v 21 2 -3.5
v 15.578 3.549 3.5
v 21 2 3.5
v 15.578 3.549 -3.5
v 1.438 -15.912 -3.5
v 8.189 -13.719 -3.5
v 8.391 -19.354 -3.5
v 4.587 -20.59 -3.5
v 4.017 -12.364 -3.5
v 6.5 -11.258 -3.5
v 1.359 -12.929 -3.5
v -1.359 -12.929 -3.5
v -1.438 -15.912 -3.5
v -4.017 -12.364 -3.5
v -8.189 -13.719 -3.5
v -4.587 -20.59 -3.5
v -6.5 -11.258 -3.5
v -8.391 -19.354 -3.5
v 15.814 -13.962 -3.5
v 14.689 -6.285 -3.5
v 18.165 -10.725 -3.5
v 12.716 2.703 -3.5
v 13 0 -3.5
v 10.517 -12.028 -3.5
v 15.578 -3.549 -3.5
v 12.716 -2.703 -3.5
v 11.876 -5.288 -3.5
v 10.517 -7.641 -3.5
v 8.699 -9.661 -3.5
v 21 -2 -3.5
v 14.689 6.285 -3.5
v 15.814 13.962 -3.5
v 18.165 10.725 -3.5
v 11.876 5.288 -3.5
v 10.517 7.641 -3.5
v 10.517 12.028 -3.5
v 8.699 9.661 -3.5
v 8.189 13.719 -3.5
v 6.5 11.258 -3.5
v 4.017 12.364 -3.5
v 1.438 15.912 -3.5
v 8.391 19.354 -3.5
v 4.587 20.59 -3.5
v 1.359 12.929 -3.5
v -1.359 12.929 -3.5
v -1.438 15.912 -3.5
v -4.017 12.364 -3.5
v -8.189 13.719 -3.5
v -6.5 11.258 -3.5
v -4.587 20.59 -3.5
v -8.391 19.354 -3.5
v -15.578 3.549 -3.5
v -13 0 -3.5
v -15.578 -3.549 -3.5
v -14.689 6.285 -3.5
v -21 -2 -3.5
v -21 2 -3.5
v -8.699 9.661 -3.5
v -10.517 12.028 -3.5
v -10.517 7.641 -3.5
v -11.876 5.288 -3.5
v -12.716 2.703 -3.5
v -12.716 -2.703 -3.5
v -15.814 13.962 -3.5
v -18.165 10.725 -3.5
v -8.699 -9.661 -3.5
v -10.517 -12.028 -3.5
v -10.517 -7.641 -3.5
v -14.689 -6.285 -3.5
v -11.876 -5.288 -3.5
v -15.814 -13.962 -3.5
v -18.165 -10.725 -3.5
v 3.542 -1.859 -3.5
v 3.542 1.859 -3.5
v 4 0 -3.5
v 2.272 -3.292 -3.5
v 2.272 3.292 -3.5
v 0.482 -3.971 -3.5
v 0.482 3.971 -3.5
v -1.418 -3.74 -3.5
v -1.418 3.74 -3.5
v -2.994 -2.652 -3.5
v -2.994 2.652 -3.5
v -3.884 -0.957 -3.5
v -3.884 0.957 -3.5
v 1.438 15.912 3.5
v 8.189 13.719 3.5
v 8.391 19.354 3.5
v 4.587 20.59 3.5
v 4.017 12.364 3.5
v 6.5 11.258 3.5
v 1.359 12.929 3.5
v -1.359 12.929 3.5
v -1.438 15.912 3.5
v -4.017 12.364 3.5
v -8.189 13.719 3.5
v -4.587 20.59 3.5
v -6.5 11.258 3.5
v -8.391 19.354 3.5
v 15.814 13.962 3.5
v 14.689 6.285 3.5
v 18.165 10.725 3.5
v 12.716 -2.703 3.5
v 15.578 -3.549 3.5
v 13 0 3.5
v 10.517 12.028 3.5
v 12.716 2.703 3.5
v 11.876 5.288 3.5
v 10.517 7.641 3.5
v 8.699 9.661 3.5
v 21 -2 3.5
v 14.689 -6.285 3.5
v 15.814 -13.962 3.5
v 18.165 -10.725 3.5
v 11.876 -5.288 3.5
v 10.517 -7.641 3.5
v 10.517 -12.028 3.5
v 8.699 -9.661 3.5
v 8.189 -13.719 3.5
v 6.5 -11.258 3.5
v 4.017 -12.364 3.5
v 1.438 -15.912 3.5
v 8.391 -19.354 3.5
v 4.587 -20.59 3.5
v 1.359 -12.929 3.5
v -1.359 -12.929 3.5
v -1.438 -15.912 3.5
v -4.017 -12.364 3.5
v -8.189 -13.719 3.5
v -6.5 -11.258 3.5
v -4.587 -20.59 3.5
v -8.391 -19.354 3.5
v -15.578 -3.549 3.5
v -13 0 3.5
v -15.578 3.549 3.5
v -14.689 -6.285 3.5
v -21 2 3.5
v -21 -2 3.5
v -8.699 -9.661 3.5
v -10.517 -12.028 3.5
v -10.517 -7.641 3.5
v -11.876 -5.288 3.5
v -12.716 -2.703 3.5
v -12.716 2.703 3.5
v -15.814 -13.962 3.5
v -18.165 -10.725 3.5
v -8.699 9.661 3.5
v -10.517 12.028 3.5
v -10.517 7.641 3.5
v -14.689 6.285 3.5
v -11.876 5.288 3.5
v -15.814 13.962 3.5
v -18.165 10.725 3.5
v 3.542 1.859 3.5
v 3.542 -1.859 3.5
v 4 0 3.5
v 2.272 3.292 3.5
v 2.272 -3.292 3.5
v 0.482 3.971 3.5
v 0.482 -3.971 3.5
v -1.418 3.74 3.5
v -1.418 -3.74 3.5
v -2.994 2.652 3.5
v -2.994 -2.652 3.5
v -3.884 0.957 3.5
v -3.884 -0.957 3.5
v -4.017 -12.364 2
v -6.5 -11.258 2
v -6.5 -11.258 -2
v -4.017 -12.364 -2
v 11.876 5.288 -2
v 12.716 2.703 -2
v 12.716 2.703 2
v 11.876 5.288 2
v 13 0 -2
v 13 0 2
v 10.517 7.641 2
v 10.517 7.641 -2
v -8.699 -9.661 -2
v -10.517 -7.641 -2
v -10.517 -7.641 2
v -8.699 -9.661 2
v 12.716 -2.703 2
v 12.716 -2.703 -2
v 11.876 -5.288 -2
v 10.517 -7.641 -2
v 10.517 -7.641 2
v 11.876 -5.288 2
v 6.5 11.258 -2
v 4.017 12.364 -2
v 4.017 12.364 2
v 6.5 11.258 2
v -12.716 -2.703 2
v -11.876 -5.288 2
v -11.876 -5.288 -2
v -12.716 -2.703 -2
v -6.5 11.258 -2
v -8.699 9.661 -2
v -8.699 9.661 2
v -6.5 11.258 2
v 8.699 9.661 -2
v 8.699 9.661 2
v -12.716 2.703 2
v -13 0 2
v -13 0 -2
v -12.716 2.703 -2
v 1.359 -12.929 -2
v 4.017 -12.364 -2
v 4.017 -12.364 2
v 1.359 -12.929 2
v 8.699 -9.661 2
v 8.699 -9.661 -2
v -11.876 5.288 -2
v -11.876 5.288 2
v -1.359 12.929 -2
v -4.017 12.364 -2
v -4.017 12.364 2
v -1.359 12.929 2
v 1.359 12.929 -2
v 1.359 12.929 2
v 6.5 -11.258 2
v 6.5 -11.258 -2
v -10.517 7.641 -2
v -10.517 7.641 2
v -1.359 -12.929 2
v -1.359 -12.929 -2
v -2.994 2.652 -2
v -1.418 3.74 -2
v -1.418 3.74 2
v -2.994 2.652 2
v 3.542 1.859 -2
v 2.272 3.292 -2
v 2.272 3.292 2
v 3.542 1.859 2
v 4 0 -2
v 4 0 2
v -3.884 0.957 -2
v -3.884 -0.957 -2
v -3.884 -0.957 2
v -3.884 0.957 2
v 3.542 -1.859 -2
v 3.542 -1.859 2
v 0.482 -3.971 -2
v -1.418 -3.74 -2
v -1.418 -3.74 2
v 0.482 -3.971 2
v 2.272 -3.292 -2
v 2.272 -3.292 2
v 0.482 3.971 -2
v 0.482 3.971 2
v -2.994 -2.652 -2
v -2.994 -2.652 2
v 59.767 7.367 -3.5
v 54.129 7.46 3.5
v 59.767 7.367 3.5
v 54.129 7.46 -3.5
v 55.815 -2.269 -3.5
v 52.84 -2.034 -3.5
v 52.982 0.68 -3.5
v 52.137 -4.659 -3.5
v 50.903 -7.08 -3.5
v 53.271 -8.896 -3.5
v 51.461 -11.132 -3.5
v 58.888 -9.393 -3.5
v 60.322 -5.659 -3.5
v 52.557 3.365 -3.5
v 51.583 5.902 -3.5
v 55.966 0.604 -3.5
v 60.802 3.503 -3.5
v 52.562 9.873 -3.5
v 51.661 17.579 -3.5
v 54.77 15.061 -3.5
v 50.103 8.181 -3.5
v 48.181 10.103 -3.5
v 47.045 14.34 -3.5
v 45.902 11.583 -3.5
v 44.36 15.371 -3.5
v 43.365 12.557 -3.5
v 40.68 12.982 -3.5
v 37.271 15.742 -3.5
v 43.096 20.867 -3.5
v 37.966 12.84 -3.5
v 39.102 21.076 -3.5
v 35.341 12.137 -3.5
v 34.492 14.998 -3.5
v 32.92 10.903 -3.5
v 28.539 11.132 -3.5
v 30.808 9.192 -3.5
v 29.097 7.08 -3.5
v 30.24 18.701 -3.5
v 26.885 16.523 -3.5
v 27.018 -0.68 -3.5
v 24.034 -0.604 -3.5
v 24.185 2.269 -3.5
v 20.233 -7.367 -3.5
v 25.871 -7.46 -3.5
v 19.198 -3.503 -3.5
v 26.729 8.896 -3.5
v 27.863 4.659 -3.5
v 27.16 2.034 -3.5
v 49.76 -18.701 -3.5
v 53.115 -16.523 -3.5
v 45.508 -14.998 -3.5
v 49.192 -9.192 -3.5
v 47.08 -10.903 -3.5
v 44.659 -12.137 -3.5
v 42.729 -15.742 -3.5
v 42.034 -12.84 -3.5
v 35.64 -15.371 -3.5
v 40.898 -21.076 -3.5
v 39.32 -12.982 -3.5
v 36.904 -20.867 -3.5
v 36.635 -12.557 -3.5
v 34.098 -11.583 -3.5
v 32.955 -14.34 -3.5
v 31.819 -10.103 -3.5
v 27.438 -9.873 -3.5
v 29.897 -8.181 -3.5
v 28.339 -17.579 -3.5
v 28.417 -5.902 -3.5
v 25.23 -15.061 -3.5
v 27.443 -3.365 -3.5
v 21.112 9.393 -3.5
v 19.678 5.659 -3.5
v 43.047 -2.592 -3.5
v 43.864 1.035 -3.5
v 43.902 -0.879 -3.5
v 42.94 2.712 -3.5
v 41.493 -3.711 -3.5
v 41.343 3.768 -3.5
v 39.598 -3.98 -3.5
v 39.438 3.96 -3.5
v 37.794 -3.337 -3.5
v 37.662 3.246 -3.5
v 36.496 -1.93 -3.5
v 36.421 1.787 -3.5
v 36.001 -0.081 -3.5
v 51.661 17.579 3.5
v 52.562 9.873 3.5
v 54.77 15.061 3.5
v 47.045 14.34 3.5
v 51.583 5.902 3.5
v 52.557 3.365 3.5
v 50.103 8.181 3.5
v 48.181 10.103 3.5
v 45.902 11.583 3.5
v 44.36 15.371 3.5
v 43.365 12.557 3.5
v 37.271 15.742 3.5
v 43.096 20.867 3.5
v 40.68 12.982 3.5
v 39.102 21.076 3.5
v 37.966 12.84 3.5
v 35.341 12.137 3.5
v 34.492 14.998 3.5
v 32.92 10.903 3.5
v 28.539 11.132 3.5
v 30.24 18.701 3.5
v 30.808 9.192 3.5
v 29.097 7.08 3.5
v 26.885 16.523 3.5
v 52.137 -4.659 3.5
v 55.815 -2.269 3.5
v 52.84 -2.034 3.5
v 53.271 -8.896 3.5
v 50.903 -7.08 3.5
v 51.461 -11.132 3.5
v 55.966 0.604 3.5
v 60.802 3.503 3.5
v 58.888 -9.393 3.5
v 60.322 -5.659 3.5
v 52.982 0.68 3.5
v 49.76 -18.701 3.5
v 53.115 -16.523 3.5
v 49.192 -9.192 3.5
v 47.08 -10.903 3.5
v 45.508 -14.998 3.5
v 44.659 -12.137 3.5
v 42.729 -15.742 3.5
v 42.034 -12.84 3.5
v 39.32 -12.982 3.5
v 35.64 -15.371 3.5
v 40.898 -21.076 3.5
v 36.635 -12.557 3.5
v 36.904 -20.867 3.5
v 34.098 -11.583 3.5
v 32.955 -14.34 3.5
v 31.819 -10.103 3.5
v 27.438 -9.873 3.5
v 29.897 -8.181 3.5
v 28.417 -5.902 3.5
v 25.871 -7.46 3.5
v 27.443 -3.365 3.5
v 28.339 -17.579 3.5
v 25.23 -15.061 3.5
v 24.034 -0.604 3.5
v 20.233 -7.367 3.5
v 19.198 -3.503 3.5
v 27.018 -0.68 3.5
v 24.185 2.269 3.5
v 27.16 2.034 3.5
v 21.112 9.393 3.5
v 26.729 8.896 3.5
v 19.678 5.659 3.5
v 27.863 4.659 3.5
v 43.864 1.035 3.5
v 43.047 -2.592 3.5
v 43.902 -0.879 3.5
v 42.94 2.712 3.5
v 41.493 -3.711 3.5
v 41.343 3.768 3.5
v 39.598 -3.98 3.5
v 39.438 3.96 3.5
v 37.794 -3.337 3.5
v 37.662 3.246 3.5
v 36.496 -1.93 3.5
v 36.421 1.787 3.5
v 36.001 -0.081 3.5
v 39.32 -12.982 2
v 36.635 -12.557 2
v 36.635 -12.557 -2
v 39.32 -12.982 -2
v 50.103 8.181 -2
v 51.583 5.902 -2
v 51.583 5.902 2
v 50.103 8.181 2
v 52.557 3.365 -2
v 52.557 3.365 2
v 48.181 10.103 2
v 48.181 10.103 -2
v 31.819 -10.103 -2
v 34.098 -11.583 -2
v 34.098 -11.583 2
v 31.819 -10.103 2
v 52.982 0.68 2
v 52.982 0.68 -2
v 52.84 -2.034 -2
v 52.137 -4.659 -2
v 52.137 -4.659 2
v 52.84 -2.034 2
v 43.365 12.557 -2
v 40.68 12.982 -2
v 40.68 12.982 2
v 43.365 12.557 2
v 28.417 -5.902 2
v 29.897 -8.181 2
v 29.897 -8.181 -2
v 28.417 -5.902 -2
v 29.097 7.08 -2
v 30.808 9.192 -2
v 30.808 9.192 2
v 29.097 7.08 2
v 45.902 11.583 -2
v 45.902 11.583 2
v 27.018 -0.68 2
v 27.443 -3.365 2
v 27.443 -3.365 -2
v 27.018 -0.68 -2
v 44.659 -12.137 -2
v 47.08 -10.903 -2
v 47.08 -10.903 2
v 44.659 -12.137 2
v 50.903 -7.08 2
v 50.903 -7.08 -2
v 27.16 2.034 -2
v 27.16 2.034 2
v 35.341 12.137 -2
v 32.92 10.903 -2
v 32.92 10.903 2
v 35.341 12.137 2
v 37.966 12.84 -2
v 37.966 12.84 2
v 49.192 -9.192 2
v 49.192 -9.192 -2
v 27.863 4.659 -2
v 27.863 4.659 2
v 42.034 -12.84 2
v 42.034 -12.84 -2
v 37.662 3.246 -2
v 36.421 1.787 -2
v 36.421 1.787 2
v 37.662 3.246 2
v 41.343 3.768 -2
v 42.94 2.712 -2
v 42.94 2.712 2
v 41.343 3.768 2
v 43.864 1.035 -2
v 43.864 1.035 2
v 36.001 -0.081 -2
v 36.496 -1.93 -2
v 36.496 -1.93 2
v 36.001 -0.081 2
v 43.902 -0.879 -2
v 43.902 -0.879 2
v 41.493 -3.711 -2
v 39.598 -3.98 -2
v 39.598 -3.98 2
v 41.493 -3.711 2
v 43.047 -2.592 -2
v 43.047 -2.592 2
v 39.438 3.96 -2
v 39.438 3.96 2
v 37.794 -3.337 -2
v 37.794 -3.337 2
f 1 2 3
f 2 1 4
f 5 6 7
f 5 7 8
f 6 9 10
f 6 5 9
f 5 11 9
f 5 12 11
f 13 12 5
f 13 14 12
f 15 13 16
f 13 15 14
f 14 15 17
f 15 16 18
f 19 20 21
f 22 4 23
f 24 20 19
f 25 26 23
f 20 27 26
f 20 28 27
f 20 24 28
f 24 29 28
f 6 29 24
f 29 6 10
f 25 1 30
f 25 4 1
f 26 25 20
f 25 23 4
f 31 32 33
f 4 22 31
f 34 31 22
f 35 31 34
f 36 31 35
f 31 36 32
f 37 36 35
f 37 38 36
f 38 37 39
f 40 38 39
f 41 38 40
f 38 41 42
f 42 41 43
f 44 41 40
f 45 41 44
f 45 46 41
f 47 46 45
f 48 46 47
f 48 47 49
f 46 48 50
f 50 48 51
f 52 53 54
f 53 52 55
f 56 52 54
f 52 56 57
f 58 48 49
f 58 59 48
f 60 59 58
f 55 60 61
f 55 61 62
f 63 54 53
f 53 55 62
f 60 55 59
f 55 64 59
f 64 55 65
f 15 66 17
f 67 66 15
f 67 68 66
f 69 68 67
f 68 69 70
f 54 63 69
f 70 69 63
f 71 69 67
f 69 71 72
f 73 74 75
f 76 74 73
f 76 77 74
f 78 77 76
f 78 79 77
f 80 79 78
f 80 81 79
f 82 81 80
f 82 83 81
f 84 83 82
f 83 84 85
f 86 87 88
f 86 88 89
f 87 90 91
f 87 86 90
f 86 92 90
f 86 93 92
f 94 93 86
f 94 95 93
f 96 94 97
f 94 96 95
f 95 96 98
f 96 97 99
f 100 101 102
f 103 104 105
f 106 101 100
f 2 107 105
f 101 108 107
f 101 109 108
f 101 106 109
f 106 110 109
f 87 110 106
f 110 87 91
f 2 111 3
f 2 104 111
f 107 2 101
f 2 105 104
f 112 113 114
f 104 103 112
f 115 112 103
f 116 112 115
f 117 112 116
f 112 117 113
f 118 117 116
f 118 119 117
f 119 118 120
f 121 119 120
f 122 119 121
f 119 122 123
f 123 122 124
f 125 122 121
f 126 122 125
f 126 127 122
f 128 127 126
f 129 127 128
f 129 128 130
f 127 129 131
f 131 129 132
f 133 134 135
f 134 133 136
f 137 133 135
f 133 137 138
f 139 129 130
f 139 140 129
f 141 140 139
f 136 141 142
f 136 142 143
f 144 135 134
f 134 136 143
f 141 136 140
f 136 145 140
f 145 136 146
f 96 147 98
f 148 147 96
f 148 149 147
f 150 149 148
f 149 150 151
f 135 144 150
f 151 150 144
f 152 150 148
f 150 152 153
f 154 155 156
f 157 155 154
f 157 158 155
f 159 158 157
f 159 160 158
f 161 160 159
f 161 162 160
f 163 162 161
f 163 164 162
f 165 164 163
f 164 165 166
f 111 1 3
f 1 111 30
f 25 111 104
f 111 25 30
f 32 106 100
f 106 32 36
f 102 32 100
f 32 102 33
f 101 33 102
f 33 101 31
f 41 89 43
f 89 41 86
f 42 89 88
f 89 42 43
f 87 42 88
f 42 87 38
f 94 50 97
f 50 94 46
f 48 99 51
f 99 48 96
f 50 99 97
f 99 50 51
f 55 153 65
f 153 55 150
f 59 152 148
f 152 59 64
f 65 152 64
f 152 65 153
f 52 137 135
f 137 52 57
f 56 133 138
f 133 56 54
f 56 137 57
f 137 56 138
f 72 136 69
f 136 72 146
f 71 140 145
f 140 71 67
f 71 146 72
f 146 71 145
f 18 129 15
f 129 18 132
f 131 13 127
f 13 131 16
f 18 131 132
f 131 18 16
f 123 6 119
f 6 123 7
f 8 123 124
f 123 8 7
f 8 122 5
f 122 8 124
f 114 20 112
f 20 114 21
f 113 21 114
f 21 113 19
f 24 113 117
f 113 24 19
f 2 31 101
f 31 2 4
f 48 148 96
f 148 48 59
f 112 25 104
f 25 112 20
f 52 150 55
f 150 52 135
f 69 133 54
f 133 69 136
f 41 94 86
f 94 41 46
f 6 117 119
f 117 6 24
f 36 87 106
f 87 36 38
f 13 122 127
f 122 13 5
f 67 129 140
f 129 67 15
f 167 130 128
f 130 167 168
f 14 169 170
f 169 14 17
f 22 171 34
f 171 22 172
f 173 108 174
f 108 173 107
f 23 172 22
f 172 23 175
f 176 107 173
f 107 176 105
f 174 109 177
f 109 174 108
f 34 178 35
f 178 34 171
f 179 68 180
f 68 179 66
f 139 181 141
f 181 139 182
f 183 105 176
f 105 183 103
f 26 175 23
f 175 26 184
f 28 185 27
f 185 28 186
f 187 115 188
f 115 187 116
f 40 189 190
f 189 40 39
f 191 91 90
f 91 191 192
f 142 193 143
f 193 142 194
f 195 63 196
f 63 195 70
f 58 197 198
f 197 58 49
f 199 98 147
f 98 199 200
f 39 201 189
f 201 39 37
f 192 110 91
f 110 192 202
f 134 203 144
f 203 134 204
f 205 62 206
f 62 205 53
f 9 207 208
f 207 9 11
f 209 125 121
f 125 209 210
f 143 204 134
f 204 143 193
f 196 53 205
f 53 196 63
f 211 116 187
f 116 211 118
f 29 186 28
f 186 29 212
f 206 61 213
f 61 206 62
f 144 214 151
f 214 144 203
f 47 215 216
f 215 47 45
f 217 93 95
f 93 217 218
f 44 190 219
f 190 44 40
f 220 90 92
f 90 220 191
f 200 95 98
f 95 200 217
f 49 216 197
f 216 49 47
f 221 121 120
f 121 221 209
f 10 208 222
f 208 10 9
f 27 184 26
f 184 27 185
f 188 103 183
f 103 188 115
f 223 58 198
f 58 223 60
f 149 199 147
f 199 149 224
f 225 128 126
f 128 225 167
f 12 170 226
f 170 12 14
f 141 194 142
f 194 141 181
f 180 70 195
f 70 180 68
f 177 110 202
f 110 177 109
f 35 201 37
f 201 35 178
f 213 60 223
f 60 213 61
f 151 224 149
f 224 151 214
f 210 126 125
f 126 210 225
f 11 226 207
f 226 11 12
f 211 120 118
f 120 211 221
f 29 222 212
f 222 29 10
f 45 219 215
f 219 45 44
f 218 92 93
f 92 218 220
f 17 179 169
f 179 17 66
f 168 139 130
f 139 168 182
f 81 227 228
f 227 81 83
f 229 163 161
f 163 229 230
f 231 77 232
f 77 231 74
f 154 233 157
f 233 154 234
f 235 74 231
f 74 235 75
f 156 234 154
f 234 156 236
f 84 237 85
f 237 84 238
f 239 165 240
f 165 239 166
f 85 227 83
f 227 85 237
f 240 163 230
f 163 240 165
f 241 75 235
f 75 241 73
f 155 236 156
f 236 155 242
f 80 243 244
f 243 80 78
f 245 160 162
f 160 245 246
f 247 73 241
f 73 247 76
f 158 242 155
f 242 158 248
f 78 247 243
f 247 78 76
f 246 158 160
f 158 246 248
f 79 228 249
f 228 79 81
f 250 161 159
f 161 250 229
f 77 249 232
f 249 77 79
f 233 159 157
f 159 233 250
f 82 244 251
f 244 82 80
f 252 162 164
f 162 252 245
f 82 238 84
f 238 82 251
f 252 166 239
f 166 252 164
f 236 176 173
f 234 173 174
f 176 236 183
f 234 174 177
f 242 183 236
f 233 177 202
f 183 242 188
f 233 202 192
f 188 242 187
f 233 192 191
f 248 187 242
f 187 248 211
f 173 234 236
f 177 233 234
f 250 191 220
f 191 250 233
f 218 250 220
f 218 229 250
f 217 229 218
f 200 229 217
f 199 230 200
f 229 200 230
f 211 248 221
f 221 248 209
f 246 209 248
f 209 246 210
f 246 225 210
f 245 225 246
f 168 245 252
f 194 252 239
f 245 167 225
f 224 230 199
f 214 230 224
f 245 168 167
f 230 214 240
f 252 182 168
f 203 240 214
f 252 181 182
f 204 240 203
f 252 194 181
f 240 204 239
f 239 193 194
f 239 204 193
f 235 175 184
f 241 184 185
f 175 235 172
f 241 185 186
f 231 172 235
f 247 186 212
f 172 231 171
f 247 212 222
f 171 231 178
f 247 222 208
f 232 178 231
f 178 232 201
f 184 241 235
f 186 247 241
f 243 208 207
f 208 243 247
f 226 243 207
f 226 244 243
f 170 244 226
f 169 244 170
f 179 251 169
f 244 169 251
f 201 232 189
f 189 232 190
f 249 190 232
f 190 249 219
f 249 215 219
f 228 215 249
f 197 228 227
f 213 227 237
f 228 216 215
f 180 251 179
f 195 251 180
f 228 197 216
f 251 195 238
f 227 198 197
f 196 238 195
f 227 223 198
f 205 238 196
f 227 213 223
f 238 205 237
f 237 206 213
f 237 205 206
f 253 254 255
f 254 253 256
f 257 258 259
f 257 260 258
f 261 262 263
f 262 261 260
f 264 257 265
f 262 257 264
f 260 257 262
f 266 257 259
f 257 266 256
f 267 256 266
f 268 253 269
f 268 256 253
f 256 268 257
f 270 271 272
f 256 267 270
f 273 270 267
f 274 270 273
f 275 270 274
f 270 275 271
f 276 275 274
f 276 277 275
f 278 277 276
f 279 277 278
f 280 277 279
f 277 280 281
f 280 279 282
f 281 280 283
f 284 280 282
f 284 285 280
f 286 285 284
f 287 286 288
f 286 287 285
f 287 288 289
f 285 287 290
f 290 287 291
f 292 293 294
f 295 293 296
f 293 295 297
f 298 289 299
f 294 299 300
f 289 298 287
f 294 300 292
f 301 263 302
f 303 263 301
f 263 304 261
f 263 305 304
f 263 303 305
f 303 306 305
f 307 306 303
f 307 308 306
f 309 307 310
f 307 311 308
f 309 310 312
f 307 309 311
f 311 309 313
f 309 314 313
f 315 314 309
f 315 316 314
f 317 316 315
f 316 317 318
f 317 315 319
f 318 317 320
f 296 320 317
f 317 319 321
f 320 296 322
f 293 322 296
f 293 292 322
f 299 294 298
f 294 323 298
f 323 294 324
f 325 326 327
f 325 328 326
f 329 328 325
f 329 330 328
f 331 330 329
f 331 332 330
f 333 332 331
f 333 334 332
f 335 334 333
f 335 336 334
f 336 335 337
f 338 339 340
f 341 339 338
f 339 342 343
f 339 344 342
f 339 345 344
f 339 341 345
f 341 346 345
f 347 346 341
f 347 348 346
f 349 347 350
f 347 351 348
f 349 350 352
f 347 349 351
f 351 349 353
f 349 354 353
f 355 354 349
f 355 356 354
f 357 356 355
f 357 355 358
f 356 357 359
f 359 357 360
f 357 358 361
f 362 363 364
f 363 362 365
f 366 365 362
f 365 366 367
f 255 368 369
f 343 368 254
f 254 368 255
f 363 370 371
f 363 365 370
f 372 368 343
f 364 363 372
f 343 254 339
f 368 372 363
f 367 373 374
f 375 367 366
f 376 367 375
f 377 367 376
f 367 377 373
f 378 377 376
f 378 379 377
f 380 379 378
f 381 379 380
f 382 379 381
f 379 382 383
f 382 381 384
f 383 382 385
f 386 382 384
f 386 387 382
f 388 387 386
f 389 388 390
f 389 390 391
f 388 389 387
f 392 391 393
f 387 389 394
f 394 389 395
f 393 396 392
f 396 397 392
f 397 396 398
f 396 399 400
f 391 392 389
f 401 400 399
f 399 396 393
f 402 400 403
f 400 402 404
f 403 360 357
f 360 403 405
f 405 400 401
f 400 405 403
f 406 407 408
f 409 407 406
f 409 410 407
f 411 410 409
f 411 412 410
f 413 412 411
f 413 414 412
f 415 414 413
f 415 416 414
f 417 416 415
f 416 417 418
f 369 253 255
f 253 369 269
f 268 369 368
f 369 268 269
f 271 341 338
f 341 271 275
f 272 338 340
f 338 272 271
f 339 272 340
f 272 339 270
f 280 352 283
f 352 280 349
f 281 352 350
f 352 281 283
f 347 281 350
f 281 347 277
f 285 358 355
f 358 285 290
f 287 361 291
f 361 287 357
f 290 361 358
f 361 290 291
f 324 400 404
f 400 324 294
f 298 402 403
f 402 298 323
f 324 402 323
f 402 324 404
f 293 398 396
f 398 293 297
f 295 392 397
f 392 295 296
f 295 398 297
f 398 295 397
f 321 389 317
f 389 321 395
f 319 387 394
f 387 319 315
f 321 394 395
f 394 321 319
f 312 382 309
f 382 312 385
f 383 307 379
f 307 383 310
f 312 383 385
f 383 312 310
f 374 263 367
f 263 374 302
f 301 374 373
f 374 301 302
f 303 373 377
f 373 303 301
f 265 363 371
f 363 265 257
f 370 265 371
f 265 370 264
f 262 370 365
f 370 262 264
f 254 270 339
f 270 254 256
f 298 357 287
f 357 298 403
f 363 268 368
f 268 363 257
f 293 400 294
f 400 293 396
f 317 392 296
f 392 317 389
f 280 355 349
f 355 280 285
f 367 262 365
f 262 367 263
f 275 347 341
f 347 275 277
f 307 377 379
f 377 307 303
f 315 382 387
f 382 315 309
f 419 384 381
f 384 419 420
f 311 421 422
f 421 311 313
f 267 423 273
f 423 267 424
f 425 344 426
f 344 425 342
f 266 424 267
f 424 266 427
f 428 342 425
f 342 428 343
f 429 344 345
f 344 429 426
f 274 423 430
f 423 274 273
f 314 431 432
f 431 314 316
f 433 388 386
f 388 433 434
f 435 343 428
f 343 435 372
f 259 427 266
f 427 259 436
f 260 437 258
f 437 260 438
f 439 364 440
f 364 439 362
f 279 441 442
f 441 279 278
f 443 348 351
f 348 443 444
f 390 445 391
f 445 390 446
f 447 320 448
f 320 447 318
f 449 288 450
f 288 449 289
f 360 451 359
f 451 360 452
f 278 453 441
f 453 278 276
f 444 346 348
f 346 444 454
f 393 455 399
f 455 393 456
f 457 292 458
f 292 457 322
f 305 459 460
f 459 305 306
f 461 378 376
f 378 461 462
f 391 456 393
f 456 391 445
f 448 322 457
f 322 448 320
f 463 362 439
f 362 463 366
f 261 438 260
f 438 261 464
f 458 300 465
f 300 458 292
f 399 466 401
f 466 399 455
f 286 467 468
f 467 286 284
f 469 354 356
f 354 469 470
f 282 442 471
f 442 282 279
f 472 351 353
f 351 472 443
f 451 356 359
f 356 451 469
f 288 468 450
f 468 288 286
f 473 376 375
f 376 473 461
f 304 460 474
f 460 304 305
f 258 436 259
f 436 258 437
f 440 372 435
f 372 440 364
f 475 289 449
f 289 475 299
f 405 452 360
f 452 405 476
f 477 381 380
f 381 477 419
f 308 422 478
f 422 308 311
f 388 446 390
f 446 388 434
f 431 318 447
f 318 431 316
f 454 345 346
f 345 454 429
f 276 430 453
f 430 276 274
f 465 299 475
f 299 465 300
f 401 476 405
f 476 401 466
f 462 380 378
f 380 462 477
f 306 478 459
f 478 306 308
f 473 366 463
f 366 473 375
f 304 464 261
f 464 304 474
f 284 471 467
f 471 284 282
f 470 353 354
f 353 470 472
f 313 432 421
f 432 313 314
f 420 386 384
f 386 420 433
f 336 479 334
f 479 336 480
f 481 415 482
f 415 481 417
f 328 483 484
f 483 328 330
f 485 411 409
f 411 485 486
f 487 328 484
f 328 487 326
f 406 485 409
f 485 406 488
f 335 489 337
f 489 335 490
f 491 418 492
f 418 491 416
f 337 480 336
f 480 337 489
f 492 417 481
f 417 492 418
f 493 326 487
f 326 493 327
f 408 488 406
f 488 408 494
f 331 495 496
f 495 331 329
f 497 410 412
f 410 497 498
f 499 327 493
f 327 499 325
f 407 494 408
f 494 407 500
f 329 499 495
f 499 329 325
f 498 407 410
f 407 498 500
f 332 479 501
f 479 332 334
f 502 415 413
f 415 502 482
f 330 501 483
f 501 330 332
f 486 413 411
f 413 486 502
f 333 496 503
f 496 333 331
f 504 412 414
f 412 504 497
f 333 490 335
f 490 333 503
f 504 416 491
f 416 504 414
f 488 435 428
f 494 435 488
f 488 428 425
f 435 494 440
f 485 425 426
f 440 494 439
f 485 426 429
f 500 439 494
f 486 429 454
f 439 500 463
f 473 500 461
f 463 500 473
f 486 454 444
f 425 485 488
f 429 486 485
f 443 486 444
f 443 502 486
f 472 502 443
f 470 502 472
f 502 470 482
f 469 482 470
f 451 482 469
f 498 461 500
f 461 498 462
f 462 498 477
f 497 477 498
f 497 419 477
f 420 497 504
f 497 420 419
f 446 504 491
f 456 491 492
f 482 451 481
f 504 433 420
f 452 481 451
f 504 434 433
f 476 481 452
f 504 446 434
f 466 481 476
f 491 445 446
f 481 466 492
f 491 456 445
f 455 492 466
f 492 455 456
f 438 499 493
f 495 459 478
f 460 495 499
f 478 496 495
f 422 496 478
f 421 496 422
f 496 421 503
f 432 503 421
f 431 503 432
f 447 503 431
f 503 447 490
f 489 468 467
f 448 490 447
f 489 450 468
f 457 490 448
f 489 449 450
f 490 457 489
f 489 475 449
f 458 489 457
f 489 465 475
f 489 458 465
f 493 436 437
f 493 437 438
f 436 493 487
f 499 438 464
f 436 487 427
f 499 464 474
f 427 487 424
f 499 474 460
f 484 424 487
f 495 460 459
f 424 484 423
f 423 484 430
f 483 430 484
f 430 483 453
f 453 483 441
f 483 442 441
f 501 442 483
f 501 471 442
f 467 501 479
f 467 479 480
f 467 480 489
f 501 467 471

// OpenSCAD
module Gear_02(){

    module Gear_01(){
        color("#a8b0b2")
        union(){
            cylinder(7,16,16,$fn=30,center= true);

            for (i=[0:45:359]) {
                r = 14; // pattern radius
                n = 10; // number of cars
                step = 360/n;
                for (i=[0:step:359]) {
                    angle = i;
                    dx = r*cos(angle);
                    dy = r*sin(angle);
                    translate([dx,dy,0])
                    rotate([0,0,angle])  
                    {
                 
                linear_extrude(7, scale = 1, center = true)
                polygon(points=[[0,-4],[7,-2],[7,2],[0,4]]);
                    }    
                }
            }
        }

    }
    difference(){
        Gear_01();
        color("#777777")
        difference(){
            cylinder(15,13,13, center = true);
            cylinder(15,4,4, center = true);

        }
    }
    color("#777777")
    cylinder(4,13,13, center = true);
}

rotate([0,0,$t*1000])
Gear_02();

translate([40,0,0])
rotate([0,0,-($t*1000)+15])
Gear_02();



// Written by Nicolì Angelo (Gengio) 2024: 
// MIT License

//Permission is hereby granted, free of charge, to any person obtaining a copy of this software and associated documentation files (the "Software"), to deal in the Software without restriction, including without limitation the rights to use, copy, modify, merge, publish, distribute, sublicense, and/or sell copies of the Software, and to permit persons to whom the Software is furnished to do so, subject to the following conditions:

//The above copyright notice and this permission notice shall be included in all copies or substantial portions of the Software.

//THE SOFTWARE IS PROVIDED "AS IS", WITHOUT WARRANTY OF ANY KIND, EXPRESS OR IMPLIED, INCLUDING BUT NOT LIMITED TO THE WARRANTIES OF MERCHANTABILITY, FITNESS FOR A PARTICULAR PURPOSE AND NONINFRINGEMENT. IN NO EVENT SHALL THE AUTHORS OR COPYRIGHT HOLDERS BE LIABLE FOR ANY CLAIM, DAMAGES OR OTHER LIABILITY, WHETHER IN AN ACTION OF CONTRACT, TORT OR OTHERWISE, ARISING FROM, OUT OF OR IN CONNECTION WITH THE SOFTWARE OR THE USE OR OTHER DEALINGS IN THE SOFTWARE.
